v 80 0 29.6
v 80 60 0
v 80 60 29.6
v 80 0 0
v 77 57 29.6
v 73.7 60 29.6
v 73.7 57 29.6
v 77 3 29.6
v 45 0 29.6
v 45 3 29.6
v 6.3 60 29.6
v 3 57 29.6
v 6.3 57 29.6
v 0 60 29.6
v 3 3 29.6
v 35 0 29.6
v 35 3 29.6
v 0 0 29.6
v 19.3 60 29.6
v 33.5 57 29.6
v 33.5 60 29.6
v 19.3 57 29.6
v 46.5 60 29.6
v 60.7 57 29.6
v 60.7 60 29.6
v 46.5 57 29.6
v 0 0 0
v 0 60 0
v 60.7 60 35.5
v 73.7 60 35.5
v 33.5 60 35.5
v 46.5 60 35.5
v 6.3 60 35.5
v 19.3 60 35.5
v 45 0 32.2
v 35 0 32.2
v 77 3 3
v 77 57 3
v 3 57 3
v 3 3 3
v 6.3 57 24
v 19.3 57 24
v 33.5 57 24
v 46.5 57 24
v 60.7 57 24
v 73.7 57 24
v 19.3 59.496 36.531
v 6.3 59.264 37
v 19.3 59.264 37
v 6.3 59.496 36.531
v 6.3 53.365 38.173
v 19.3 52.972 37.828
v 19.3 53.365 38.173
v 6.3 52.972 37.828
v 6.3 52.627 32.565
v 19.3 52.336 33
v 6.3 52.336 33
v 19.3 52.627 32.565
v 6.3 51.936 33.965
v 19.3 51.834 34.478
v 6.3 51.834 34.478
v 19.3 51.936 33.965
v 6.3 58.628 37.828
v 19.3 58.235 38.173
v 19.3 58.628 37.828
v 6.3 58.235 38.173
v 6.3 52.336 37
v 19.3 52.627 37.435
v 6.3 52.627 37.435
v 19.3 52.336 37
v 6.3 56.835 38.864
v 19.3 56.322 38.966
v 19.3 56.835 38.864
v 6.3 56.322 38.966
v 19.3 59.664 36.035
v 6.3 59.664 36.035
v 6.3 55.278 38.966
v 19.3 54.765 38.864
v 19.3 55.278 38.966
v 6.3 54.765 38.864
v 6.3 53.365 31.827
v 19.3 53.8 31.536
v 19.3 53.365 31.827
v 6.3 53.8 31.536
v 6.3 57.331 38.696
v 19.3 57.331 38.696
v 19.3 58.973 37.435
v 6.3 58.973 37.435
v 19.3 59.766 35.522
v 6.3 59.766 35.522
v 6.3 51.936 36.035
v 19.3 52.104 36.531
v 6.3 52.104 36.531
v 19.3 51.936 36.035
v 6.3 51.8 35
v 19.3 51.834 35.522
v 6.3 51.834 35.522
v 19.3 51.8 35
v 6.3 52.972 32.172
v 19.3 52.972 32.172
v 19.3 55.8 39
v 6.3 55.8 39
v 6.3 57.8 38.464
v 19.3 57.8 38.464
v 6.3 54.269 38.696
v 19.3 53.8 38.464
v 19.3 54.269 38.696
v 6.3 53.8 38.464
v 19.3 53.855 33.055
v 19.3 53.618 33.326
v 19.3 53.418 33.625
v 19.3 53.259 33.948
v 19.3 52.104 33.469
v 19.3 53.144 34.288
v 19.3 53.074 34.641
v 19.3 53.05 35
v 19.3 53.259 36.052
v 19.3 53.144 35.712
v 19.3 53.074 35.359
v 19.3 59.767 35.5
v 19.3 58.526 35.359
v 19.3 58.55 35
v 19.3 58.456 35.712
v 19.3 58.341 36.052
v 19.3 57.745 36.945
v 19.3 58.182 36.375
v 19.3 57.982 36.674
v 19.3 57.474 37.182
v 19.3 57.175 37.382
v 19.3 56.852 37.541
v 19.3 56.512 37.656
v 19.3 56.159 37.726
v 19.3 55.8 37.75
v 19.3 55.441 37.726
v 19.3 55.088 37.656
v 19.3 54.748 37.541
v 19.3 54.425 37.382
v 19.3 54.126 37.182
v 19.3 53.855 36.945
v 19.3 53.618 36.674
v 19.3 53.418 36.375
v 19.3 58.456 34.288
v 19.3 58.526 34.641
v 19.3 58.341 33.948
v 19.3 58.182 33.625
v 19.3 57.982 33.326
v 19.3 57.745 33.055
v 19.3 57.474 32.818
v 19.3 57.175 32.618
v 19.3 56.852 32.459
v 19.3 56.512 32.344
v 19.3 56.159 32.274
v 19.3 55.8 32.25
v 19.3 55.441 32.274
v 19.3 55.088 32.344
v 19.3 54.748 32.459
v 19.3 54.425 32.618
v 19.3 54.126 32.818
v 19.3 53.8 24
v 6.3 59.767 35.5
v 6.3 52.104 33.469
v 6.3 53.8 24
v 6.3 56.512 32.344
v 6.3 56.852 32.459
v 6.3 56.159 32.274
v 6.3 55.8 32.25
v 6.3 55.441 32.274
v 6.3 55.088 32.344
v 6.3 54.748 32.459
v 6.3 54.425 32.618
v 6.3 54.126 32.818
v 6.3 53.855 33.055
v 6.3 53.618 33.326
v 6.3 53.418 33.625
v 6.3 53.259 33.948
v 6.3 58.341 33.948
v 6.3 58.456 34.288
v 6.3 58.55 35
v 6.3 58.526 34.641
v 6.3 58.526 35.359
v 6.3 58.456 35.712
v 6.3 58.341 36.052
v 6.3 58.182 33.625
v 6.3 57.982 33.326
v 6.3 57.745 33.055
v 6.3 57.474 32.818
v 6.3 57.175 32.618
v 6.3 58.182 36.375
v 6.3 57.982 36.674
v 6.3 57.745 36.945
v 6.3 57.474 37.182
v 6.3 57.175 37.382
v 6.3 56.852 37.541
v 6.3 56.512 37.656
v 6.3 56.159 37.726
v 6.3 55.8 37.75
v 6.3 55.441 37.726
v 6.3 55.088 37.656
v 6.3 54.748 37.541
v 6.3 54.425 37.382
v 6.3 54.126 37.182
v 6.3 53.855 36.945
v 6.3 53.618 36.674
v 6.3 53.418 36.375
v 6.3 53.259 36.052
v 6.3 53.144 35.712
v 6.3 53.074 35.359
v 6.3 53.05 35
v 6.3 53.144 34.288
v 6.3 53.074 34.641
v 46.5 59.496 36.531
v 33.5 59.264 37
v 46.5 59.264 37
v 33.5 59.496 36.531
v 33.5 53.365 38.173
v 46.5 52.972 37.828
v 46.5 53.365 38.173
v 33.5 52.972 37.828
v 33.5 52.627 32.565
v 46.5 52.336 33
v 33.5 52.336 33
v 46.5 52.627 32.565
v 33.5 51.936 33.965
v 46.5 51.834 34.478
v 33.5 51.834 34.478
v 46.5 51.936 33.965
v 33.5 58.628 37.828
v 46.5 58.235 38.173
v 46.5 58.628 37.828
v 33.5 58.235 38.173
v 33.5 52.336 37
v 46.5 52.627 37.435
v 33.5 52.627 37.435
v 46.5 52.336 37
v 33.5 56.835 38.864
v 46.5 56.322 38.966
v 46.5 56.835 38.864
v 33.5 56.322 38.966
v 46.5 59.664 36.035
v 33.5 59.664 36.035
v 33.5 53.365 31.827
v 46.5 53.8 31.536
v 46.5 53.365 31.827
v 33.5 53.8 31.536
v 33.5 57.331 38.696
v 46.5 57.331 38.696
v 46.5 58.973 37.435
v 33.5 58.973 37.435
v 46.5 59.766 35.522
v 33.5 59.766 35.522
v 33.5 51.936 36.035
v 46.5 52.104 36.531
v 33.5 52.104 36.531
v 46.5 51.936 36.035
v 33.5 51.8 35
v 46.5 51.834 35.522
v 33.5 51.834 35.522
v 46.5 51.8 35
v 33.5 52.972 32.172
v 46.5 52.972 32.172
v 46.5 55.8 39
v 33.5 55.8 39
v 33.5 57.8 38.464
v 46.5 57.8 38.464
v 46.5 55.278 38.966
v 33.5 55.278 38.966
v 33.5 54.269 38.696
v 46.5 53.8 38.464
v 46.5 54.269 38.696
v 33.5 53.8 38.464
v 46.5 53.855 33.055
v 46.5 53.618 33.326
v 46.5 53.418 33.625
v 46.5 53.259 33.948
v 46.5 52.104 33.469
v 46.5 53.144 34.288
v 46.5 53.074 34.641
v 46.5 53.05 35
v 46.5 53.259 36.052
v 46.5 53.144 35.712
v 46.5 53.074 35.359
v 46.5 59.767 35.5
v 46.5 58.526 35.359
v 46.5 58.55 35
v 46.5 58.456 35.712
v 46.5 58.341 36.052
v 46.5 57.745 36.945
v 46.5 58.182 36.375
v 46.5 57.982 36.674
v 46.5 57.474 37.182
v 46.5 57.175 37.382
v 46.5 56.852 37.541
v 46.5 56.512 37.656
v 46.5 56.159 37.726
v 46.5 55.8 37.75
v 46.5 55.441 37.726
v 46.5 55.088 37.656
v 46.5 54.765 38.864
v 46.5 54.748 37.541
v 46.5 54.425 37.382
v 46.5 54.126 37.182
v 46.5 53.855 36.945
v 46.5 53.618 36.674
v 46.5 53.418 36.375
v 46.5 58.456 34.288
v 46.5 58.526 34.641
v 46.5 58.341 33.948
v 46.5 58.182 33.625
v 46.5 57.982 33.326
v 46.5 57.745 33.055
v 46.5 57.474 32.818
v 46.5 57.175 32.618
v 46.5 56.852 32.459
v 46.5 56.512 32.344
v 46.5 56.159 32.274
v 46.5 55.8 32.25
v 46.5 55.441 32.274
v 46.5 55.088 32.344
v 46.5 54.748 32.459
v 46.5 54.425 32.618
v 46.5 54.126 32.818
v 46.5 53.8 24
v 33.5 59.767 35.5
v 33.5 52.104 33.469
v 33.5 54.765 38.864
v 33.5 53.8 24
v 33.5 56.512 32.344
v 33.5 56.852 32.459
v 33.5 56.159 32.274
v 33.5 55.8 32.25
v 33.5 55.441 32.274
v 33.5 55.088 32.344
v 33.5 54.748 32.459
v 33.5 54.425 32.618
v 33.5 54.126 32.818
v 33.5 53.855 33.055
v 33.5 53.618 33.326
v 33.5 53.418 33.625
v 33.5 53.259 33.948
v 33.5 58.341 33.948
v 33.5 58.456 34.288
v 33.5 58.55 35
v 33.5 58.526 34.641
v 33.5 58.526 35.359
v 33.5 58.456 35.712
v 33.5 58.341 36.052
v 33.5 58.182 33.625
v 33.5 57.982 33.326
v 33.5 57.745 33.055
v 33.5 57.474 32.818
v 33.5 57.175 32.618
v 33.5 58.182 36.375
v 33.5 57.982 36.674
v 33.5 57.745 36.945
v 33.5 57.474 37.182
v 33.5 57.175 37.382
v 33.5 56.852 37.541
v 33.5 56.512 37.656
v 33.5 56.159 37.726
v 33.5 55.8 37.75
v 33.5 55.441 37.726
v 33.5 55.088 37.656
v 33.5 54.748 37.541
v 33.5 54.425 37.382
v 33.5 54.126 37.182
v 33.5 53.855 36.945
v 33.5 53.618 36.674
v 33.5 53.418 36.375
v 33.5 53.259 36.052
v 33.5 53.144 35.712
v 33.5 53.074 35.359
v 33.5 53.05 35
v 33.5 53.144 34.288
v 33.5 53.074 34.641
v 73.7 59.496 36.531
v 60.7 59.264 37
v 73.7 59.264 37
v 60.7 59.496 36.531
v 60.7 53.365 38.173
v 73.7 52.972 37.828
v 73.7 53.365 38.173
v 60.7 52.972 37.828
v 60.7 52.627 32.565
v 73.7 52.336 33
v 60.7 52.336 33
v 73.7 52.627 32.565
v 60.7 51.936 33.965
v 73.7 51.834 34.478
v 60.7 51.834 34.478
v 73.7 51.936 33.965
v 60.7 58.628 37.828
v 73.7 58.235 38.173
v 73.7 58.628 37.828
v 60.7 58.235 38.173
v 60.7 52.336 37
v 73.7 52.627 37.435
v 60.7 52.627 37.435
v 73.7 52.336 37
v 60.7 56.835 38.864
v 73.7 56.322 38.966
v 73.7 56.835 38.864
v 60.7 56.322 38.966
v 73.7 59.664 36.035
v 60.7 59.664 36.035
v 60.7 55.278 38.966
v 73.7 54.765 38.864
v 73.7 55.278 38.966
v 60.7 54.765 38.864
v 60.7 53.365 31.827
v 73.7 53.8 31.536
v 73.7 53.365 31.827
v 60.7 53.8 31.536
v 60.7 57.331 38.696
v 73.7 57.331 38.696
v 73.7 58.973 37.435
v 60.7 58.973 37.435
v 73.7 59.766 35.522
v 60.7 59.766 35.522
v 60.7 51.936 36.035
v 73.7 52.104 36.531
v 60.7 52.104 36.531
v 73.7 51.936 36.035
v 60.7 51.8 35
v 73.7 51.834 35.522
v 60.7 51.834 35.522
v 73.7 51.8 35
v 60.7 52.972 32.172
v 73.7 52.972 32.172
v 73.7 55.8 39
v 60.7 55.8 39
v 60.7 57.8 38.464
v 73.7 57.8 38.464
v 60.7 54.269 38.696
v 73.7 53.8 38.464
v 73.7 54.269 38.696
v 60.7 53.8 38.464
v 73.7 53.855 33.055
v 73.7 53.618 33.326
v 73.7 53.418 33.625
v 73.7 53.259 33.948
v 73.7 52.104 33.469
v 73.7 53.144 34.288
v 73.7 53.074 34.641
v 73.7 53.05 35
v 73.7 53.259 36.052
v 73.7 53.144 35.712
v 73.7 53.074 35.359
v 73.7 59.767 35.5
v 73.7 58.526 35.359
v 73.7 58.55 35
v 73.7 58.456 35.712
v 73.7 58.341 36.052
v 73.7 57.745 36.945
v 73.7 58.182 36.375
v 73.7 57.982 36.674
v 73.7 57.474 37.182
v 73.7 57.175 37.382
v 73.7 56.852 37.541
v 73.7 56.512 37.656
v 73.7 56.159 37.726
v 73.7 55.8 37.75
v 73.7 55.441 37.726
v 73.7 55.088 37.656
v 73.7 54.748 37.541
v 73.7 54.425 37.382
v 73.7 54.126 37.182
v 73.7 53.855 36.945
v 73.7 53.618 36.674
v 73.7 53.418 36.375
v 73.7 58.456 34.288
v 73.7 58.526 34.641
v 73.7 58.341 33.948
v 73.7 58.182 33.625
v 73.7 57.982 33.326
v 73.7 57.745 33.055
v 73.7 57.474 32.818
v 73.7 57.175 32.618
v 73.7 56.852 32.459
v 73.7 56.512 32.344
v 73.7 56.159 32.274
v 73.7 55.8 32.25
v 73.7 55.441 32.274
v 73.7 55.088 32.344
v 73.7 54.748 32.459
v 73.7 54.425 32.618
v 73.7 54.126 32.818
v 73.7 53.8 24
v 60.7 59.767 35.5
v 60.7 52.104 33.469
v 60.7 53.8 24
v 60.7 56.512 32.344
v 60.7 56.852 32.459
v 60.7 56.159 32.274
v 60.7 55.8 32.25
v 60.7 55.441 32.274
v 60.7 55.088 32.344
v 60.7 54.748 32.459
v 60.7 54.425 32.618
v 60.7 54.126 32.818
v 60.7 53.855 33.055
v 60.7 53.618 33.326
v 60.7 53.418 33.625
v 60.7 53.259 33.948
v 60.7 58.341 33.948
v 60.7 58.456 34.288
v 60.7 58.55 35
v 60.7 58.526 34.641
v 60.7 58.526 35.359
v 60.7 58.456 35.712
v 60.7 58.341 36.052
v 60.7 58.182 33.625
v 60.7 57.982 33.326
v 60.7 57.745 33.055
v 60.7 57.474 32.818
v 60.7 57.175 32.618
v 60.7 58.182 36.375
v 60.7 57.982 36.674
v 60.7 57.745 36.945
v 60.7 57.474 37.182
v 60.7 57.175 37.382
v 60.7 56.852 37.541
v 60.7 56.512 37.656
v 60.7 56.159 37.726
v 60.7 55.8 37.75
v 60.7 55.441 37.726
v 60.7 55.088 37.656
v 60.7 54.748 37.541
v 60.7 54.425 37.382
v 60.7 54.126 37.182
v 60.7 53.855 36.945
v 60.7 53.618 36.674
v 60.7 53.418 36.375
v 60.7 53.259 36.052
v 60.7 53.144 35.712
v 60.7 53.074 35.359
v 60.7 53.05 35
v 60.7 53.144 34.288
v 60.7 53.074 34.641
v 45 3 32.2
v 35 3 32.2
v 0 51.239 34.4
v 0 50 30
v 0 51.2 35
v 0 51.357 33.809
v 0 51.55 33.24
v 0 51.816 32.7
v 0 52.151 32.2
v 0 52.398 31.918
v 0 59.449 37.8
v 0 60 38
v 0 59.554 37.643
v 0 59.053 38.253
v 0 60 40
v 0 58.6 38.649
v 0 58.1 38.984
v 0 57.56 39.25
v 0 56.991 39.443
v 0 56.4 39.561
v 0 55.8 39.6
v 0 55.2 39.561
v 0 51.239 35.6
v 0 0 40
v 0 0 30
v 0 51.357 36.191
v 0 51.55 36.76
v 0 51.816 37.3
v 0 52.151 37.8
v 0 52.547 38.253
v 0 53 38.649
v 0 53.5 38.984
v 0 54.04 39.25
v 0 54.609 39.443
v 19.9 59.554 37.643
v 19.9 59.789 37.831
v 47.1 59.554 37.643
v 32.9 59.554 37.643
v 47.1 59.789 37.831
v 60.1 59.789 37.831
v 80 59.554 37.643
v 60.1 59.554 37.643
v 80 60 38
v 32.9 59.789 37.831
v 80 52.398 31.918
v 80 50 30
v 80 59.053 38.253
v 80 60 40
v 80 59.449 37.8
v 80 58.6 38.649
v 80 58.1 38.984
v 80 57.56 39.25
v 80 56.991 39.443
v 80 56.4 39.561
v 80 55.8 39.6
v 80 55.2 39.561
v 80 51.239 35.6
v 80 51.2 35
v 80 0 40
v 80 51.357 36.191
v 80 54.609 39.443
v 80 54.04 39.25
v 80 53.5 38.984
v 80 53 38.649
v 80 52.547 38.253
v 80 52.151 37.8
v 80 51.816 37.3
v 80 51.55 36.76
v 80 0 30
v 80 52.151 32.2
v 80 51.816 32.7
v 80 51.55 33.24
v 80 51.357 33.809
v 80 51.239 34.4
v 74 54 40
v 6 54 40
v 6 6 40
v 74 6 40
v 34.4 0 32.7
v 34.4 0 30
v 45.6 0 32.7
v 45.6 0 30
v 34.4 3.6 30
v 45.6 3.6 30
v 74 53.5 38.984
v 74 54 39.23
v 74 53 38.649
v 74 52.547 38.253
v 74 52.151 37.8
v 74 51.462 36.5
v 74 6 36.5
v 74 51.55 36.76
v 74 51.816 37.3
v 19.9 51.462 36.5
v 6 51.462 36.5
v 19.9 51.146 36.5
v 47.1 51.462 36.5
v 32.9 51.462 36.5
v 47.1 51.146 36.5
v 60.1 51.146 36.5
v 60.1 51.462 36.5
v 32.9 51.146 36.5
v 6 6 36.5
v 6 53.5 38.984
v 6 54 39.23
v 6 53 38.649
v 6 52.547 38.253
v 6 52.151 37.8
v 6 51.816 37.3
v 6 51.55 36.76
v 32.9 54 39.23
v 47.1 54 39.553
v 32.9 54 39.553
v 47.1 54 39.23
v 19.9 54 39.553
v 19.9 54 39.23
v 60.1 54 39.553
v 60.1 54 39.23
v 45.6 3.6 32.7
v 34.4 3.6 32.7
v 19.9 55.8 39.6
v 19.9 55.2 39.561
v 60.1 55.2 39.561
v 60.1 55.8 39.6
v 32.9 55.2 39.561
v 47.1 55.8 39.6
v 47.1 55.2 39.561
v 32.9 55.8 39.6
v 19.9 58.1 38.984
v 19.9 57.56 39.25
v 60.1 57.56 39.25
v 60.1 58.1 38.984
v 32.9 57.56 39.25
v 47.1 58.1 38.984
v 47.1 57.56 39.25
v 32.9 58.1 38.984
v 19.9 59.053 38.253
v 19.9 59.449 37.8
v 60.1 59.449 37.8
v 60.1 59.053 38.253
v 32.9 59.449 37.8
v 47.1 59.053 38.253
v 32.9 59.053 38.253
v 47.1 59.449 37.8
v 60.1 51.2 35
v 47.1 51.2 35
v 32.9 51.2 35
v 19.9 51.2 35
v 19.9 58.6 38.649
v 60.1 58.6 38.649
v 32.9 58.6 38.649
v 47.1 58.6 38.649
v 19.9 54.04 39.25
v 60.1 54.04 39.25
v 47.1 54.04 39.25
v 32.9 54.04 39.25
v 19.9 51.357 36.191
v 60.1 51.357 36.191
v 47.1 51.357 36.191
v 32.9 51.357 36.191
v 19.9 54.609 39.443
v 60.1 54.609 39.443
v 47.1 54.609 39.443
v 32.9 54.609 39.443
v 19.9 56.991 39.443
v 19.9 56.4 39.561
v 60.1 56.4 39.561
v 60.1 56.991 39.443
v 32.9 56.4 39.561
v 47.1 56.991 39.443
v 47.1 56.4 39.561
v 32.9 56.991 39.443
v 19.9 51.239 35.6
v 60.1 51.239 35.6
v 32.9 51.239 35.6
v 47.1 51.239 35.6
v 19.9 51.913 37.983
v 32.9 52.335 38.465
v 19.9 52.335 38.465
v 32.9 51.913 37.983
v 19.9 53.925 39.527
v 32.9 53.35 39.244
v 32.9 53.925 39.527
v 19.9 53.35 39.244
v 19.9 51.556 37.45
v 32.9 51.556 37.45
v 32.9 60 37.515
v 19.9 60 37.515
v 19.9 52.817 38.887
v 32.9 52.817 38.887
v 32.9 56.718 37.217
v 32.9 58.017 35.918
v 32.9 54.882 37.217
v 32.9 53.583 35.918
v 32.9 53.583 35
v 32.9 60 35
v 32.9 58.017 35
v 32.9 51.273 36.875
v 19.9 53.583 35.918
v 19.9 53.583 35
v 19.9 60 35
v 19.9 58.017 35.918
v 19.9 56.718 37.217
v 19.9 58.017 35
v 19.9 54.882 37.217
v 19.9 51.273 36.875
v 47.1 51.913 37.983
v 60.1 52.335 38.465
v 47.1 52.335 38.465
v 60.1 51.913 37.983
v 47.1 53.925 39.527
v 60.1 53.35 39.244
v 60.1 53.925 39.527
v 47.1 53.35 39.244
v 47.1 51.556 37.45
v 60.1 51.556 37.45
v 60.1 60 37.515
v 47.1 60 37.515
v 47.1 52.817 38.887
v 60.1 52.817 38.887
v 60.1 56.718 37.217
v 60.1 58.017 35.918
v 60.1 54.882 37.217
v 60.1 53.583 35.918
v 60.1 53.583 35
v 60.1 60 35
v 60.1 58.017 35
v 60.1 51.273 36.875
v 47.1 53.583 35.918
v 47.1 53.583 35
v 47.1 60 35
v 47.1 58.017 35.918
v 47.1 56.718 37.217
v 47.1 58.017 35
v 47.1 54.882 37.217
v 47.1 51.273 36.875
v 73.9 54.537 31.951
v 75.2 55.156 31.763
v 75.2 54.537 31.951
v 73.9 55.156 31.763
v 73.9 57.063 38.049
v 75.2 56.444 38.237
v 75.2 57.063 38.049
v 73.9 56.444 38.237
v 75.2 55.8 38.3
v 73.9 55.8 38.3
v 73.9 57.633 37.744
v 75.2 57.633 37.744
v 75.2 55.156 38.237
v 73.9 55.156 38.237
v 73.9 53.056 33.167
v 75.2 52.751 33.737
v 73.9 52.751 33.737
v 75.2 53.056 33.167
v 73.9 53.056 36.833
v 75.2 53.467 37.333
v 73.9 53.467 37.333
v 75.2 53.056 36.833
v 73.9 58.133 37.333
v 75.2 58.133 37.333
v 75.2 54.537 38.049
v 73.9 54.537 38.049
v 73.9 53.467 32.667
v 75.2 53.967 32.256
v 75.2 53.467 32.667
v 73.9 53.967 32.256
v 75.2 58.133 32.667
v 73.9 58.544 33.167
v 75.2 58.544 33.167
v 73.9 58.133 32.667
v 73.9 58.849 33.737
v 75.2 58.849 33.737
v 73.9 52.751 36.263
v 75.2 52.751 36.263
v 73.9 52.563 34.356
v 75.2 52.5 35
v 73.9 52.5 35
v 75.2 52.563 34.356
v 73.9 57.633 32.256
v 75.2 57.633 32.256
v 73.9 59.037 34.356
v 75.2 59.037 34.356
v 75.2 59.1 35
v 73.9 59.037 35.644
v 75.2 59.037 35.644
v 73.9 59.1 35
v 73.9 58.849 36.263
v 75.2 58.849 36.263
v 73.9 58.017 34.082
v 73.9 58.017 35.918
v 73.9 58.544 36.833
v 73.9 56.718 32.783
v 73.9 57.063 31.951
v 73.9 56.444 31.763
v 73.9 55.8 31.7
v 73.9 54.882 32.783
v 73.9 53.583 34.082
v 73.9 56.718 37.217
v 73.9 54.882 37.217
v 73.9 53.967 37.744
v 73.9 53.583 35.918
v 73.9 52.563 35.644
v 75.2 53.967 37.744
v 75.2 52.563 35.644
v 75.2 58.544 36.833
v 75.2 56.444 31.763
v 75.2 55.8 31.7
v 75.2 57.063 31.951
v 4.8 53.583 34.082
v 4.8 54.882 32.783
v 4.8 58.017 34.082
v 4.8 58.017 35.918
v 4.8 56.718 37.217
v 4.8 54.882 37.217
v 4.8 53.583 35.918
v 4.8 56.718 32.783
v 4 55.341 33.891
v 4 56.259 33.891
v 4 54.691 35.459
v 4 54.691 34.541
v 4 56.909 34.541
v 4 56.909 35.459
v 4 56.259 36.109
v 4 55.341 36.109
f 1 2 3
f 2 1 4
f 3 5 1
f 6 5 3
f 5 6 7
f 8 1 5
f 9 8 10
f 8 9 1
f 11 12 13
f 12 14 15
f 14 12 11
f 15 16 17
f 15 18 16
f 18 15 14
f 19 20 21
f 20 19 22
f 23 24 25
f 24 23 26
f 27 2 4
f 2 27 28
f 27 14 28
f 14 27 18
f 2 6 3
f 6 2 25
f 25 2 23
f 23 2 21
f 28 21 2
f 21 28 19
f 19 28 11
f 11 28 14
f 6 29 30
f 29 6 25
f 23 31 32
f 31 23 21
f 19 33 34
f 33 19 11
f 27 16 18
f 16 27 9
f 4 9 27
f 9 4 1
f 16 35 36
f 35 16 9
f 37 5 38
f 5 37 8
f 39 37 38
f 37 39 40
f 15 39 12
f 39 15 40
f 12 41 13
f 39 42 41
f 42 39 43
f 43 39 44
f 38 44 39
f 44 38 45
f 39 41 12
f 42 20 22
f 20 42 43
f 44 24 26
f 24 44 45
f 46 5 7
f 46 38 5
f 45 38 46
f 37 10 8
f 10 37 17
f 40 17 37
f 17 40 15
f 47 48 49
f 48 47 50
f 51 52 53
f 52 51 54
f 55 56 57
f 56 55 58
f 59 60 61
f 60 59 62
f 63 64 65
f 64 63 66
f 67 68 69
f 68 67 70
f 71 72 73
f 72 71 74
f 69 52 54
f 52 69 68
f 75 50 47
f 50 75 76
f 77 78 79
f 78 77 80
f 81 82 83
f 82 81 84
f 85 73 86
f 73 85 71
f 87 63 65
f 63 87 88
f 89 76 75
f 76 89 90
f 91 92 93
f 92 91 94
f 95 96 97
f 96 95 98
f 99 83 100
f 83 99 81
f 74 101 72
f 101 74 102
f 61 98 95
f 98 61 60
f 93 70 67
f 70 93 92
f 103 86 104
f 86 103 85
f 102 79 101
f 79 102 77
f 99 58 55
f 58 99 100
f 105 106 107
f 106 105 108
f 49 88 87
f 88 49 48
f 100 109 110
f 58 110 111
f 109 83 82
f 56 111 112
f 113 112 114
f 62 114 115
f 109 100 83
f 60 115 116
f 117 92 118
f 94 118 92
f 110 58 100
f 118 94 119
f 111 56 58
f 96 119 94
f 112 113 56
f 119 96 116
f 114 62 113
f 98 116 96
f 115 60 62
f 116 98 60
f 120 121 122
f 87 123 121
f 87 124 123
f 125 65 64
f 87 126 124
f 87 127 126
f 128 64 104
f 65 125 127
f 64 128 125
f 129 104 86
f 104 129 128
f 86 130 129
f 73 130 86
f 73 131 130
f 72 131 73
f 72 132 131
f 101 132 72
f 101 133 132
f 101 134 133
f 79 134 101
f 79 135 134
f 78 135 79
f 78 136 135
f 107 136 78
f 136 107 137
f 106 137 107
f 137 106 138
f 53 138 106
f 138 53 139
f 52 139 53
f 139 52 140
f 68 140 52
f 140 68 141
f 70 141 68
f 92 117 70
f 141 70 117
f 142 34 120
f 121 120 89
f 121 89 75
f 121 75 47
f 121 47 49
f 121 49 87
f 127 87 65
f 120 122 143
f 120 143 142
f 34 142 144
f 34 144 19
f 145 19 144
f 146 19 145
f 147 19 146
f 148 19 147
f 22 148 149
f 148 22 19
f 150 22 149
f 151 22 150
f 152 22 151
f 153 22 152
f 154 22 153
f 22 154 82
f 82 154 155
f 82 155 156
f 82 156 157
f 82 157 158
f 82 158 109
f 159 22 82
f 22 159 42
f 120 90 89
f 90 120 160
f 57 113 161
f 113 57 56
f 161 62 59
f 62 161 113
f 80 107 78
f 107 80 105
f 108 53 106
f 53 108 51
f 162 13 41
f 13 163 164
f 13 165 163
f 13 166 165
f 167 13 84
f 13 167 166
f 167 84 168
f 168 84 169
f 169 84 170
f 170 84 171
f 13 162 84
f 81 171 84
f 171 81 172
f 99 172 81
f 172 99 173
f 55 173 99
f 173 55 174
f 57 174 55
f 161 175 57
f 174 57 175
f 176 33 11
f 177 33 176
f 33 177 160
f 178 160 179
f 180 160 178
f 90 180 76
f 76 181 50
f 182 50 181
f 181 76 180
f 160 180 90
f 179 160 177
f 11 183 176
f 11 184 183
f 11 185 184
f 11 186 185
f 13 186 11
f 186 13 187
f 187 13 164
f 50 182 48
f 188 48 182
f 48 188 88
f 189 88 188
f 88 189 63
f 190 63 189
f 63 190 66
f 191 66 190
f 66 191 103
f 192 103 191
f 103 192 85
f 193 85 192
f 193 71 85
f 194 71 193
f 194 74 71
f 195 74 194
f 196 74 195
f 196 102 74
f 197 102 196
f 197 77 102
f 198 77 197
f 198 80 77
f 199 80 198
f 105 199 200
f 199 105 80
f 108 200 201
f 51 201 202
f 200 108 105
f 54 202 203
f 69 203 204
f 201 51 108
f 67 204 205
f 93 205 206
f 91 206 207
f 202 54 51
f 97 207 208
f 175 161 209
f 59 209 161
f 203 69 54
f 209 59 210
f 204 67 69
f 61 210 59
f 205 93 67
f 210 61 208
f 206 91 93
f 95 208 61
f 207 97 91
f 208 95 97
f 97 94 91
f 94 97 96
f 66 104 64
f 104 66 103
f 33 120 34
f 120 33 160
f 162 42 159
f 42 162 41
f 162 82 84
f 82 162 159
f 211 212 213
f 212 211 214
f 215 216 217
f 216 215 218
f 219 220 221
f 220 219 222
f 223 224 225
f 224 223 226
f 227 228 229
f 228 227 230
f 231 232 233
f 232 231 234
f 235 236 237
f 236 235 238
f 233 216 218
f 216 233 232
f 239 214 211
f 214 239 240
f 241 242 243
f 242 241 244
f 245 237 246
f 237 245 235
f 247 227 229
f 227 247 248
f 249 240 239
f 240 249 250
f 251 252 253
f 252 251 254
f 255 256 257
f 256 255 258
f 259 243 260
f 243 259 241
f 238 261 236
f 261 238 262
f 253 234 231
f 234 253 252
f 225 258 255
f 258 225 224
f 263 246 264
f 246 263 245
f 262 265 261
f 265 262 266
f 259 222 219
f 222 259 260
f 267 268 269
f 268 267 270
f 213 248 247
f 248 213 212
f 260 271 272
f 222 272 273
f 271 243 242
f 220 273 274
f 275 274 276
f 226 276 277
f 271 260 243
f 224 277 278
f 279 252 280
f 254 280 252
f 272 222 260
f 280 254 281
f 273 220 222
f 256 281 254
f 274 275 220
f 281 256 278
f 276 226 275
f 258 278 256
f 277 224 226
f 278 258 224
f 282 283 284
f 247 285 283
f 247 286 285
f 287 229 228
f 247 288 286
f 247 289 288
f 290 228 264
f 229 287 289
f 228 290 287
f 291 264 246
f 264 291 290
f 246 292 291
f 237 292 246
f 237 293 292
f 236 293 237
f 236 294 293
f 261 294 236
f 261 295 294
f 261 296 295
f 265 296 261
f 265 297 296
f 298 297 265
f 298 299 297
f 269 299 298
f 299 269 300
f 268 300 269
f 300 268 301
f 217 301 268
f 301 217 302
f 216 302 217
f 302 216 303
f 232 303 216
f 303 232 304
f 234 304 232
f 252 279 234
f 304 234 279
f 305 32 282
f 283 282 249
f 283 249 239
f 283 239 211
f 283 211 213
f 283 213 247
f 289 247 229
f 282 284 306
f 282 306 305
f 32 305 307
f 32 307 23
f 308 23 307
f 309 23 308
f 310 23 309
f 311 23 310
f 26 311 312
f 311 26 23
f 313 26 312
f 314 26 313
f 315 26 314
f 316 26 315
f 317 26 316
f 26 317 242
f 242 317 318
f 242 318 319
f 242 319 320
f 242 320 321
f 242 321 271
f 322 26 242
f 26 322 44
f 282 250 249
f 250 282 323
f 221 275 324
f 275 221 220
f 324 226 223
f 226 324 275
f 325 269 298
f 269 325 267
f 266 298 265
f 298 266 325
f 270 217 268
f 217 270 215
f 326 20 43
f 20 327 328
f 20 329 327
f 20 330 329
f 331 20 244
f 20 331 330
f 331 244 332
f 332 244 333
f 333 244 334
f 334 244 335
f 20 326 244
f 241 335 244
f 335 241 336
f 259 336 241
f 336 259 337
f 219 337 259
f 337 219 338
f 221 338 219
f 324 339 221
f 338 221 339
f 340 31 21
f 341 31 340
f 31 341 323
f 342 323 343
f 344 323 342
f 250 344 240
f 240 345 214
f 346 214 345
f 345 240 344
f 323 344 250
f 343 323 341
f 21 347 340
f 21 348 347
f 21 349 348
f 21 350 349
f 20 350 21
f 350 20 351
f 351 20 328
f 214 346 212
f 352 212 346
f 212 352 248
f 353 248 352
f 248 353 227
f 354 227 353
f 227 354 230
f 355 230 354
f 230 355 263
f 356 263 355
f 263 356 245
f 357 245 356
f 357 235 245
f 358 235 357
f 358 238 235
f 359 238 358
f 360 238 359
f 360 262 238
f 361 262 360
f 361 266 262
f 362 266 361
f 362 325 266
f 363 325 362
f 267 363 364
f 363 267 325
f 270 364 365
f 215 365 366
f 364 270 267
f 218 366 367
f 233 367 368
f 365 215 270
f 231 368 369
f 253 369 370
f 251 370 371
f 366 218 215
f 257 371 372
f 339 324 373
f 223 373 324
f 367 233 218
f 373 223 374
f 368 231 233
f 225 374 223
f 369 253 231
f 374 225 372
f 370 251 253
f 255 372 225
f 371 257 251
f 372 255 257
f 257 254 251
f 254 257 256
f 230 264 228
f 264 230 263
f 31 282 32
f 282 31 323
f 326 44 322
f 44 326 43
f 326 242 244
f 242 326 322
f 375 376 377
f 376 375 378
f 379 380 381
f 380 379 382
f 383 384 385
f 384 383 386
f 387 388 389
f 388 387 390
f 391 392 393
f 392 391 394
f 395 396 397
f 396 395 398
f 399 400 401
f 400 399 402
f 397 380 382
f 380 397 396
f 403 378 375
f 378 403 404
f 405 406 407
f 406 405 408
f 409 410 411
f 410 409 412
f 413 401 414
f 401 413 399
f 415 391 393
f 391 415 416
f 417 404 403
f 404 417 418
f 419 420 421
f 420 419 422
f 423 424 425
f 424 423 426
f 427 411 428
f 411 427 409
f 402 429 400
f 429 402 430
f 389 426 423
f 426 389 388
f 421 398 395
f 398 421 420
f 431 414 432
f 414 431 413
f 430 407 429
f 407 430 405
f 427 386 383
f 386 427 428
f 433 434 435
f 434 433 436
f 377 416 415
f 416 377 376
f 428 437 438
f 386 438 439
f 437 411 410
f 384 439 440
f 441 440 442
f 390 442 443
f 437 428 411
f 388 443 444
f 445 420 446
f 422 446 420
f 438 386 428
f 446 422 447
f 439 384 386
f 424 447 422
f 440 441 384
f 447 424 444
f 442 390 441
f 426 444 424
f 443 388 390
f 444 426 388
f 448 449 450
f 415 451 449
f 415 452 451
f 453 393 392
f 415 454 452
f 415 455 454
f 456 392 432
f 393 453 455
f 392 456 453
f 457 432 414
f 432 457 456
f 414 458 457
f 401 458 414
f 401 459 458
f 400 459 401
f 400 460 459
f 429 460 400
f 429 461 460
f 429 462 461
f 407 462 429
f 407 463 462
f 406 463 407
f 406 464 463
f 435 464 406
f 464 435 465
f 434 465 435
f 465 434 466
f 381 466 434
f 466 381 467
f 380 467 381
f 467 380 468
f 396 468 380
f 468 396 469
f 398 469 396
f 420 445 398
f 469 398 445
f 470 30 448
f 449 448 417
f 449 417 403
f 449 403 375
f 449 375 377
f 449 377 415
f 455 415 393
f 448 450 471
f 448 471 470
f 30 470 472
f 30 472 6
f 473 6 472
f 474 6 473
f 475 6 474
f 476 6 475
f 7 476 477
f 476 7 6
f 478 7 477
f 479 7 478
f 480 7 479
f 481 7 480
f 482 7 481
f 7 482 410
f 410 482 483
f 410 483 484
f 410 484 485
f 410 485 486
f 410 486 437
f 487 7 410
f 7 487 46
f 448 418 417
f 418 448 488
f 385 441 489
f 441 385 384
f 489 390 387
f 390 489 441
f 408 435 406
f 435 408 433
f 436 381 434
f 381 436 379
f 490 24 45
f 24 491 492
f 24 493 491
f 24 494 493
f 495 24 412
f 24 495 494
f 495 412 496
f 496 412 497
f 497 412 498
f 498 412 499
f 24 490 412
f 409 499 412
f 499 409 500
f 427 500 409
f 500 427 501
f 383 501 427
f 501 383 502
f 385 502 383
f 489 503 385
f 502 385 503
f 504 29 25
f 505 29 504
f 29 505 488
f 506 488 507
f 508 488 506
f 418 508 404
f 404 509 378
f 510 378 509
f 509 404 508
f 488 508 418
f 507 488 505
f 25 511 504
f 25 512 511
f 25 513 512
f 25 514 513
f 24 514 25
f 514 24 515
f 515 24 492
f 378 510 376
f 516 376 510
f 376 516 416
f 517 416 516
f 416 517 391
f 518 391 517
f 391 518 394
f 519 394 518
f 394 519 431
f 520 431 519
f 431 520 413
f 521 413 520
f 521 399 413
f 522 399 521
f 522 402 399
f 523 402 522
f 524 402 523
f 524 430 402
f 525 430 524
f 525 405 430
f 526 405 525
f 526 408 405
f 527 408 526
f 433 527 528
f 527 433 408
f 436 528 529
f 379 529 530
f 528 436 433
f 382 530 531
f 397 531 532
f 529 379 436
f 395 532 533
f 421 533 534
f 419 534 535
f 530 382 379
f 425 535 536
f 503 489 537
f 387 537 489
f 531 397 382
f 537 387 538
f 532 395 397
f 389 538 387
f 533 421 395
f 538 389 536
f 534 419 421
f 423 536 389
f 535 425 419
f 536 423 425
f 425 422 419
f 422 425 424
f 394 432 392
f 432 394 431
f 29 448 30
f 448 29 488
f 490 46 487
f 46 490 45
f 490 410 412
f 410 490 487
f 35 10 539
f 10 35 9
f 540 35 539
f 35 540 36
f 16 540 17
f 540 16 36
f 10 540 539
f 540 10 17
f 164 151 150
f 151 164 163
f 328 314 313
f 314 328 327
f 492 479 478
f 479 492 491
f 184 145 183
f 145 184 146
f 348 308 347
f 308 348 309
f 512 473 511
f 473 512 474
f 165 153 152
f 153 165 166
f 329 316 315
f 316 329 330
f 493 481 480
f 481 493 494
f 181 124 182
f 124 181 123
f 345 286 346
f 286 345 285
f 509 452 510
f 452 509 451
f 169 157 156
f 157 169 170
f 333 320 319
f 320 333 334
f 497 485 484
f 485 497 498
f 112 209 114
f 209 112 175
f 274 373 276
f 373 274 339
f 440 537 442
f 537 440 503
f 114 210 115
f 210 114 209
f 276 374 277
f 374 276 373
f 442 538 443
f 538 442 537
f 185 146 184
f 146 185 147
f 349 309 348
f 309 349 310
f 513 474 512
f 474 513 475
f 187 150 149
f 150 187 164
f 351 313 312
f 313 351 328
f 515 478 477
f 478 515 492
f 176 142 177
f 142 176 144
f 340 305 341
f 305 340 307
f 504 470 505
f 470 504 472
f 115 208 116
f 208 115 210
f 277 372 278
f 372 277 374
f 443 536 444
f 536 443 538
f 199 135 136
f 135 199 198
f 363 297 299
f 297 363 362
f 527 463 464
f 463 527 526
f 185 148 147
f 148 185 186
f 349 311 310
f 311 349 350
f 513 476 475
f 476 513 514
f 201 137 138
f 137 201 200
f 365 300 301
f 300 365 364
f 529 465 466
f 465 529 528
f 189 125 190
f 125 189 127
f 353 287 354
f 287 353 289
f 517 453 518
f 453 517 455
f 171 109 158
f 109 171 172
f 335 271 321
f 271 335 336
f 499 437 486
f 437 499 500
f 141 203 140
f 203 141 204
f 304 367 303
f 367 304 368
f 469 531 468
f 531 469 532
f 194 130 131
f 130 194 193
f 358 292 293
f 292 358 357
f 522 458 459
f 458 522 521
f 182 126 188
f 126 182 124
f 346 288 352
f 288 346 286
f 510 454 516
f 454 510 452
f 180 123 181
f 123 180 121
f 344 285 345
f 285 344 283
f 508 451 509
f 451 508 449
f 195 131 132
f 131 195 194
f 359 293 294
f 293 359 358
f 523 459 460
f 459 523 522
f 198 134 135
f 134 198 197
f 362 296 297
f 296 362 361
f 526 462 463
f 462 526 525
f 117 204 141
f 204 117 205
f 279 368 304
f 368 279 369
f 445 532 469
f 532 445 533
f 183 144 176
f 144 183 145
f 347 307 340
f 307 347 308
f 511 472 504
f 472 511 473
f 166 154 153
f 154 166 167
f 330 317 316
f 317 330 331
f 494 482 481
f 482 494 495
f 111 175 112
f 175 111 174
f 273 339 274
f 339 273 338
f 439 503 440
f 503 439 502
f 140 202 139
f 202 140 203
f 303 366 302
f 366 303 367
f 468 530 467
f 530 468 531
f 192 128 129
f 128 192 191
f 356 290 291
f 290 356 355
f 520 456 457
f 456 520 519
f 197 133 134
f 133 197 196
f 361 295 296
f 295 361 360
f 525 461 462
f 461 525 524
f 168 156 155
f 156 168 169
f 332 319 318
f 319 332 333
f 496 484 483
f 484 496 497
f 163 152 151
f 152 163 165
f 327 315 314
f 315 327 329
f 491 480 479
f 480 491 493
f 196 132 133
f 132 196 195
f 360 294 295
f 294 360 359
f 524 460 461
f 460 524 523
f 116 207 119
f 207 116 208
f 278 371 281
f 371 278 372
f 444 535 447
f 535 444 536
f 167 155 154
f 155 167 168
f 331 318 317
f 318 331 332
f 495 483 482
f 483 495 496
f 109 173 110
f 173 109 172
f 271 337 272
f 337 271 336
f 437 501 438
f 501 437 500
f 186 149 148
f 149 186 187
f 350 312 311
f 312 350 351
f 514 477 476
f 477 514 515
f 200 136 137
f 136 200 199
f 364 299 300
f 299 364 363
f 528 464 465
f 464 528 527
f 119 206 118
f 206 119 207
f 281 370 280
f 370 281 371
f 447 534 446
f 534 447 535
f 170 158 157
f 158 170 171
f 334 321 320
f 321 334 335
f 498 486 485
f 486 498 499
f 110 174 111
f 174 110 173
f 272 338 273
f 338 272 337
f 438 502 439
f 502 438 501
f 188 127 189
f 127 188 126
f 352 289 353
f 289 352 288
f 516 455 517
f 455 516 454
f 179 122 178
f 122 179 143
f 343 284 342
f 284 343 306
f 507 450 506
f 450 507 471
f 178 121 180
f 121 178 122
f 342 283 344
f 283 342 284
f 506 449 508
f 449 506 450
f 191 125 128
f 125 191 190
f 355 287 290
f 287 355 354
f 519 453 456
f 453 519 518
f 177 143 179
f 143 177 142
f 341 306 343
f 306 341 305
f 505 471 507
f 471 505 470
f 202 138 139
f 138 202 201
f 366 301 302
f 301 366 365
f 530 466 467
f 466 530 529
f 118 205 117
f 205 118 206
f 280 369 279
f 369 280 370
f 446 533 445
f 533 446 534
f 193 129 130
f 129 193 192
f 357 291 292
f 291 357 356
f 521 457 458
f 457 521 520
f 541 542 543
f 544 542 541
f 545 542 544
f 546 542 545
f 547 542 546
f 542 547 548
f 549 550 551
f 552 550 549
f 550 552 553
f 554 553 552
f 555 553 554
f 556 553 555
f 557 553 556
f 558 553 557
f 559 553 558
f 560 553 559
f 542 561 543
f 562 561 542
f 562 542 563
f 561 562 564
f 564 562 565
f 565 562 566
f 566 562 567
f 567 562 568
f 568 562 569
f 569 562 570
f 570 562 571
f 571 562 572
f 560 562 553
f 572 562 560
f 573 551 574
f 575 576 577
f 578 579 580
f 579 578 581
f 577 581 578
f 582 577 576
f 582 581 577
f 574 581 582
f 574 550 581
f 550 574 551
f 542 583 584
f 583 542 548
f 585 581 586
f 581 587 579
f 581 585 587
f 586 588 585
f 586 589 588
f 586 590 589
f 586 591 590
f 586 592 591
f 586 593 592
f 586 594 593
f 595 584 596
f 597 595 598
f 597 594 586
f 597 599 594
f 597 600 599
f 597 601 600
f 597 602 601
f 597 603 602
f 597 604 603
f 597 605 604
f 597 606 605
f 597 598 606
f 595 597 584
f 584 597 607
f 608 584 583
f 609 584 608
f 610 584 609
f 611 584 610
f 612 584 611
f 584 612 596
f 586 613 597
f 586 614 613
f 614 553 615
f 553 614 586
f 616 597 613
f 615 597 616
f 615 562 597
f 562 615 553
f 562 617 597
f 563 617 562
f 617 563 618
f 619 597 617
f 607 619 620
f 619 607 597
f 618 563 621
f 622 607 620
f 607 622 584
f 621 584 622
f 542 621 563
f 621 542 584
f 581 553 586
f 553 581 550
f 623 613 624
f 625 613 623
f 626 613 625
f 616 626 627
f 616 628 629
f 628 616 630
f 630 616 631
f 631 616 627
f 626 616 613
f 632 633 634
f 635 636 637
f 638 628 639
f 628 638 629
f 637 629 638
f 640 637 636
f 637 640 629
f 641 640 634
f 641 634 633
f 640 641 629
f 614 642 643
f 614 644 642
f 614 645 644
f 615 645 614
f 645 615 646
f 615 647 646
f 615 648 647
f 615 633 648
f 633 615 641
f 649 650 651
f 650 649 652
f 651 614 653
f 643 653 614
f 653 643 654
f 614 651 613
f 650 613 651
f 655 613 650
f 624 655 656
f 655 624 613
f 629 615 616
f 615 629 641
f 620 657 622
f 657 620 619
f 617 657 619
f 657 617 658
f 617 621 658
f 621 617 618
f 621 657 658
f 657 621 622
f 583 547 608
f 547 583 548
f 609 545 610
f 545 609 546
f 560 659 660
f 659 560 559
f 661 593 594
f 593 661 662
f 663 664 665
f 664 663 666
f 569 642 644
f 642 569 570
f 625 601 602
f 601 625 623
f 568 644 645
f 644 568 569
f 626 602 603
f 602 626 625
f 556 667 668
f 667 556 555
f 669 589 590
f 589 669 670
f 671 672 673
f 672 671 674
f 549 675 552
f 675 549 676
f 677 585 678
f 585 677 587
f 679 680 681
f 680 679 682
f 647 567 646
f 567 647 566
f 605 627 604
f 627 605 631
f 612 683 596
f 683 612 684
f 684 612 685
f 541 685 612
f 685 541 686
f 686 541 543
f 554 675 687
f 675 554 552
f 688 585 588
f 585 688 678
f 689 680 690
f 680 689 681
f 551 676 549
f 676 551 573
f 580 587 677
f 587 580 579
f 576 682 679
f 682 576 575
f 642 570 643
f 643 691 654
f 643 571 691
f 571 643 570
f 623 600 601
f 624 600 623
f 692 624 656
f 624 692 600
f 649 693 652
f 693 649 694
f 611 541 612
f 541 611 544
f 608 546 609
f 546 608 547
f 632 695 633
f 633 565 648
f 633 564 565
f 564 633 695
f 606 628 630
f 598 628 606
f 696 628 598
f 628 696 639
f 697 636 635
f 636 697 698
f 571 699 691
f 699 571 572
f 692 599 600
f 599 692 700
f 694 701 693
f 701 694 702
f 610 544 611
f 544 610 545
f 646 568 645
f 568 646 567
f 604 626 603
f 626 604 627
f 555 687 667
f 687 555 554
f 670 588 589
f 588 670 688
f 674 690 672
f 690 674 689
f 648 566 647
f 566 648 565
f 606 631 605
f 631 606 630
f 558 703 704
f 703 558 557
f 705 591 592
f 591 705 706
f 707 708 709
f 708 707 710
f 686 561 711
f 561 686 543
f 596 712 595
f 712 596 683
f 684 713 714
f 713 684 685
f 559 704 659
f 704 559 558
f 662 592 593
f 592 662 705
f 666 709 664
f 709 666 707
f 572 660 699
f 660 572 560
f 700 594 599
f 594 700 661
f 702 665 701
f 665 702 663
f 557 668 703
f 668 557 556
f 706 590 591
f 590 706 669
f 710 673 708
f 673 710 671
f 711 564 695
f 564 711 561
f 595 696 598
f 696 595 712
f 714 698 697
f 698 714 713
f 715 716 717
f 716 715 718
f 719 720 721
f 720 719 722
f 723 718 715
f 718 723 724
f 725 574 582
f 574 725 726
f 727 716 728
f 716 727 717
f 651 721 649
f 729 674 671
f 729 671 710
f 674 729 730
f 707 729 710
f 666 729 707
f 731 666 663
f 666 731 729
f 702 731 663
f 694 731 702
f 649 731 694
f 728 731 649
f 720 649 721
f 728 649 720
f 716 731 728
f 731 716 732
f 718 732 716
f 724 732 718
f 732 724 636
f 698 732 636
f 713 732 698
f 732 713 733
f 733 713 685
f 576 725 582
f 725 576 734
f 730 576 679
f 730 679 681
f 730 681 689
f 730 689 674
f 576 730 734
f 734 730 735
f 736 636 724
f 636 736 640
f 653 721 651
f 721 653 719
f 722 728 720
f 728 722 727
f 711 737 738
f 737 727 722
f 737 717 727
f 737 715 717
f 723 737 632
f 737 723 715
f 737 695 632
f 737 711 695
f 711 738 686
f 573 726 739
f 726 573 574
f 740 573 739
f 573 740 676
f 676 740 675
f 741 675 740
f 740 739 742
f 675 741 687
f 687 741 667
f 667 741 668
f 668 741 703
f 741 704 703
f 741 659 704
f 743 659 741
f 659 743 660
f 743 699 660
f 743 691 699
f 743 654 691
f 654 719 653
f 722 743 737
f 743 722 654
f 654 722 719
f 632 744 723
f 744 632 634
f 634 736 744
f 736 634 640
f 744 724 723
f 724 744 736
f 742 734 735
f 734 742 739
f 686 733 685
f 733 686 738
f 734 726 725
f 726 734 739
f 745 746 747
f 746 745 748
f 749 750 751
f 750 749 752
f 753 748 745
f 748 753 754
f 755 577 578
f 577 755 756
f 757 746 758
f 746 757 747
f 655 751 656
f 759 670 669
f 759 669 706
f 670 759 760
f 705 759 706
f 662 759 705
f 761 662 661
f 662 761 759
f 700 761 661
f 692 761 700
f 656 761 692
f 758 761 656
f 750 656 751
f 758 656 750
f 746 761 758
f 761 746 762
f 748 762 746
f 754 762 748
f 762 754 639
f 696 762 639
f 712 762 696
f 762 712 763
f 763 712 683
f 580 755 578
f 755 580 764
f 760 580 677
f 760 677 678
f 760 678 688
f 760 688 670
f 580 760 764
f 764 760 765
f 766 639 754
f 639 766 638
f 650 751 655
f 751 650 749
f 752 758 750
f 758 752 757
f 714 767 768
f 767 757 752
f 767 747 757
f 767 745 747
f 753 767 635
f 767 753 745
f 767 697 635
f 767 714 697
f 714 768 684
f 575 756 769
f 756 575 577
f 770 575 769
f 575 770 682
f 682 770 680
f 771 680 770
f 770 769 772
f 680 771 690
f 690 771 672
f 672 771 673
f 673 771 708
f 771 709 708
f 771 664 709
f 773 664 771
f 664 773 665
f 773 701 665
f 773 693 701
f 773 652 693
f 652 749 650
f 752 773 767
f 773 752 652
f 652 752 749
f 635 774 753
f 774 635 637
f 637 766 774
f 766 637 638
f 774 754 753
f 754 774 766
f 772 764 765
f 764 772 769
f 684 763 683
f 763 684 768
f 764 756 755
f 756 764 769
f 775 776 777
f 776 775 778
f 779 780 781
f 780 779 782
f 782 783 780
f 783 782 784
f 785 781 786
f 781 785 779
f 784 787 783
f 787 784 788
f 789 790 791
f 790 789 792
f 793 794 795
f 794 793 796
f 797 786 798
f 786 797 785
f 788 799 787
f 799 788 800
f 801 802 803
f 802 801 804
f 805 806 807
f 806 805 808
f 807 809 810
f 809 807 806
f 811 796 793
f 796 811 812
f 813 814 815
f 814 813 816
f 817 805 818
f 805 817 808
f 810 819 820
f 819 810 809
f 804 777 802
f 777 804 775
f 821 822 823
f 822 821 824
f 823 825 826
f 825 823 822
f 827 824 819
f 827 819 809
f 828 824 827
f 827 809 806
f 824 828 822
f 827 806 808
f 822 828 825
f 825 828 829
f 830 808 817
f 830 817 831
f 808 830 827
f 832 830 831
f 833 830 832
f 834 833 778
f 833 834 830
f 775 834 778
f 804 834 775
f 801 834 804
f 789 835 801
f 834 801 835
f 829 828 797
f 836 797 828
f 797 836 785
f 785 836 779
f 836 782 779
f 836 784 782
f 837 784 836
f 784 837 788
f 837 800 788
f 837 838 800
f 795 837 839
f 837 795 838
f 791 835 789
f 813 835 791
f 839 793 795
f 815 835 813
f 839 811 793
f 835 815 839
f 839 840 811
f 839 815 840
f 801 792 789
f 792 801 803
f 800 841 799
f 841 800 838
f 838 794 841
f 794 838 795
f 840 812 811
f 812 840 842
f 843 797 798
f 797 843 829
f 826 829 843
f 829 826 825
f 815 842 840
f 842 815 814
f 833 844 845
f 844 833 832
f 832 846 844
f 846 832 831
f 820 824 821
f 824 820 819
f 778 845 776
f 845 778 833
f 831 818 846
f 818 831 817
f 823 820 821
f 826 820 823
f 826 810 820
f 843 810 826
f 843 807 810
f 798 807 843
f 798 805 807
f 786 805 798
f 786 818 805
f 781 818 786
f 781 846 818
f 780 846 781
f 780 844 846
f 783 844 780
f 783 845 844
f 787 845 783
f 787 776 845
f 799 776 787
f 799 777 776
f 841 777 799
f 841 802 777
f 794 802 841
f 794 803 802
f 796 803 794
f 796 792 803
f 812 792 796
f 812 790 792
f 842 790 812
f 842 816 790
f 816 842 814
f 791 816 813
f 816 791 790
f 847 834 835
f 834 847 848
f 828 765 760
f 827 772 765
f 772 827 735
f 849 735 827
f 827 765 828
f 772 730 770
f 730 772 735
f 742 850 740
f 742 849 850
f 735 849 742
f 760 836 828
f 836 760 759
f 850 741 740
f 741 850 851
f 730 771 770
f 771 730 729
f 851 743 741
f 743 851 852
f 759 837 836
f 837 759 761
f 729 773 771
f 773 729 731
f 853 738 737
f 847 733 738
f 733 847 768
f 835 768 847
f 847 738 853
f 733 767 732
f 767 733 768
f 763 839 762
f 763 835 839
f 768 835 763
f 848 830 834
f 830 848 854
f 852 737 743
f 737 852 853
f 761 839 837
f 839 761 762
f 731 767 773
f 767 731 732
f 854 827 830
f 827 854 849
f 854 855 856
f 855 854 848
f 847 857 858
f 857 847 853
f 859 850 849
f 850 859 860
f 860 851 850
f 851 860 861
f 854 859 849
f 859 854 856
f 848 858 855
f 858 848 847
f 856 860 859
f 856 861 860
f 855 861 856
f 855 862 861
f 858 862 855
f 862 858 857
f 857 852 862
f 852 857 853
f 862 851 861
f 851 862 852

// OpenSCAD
// Print-in-place hinged box, 80 x 60 x 40 mm closed.
// Printed closed in PLA (Bambu A1, 0.4 nozzle): base, lid and a captive
// hinge pin are separate bodies with 0.35-0.6 mm clearances, so the hinge
// breaks free by hand.  No supports: the lid underside bridges the cavity,
// the hinge barrels/pin use faceted (octagonal) lower surfaces, and all
// other downward faces are short bridges or rest on the body below.

/* [Part] */
part = "assembly"; // [assembly, box, lid, pin]

/* [Dimensions] */
box_w = 80;          // X, outside
box_d = 60;          // Y, outside (front y=0, back y=60)
box_h = 29.6;        // base height to its rim
lid_h = 10;          // lid height; lid bottom at z=30 (0.4 gap)
lid_z = 30;
wall = 3;
floor_t = 3;
total_h = 40;

hinge_y = 55.8;      // hinge axis, assembly coords
hinge_z = 35;
barrel_r = 4.0;
pin_r = 2.4;         // octagon circumradius
bore_r = 2.75;       // pin_r + 0.35 radial clearance
relief_r = 4.6;      // barrel_r + 0.6

// Alternating knuckles along the back edge (x intervals), 0.6 mm end gaps.
box_segs  = [[6.3, 19.3], [33.5, 46.5], [60.7, 73.7]];
lid_segs  = [[19.9, 32.9], [47.1, 60.1]];

cadverify_only = "";
module instance(name, part_name, unit = 1) {
    echo(cadverify_instance = [name, part_name, unit]);
    if (cadverify_only == "" || cadverify_only == name) children();
}

// ---------------------------------------------------------------- base (box)
module box_main() {
    difference() {
        union() {
            // shell: outer block minus open-top cavity
            difference() {
                cube([box_w, box_d, box_h]);
                translate([wall, wall, floor_t]) cube([box_w - 2 * wall, box_d - 2 * wall, box_h]);
            }
            // hinge knuckles (base) + support posts down to the back wall
            for (s = box_segs) {
                translate([s[0], hinge_y, hinge_z]) rotate([0, 90, 0])
                    cylinder(h = s[1] - s[0], r = barrel_r, $fn = 48);
                translate([s[0], 53.8, 24]) cube([s[1] - s[0], 6.2, 11.5]);
            }
            // front catch tooth (enters the socket in the lid)
            translate([35, 0, box_h]) cube([10, wall, 2.6]);
        }
        // pin bore through the base knuckles
        translate([-1, hinge_y, hinge_z]) rotate([0, 90, 0])
            cylinder(h = box_w + 2, r = bore_r, $fn = 48);
    }
}

// ---------------------------------------------------------------- lid (local: z 0..10, hinge axis at z=5)
module lid_main() {
    union() {
        difference() {
            union() {
                // main slab, side profile (Y-Z) extruded along X.
                // Rear lower edge chamfered 50,0 -> 60,8 so the slab
                // swings clear of the base back wall.
                multmatrix([[0, 0, 1, 0], [1, 0, 0, 0], [0, 1, 0, 0], [0, 0, 0, 1]])
                    linear_extrude(height = box_w)
                        polygon(points = [[0, 0], [50, 0], [60, 8], [60, 10], [0, 10]]);
                // hinge knuckles (lid)
                for (s = lid_segs)
                    translate([s[0], hinge_y, 5]) rotate([0, 90, 0])
                        cylinder(h = s[1] - s[0], r = barrel_r, $fn = 48);
            }
            // recessed panel in the top face
            translate([6, 6, 6.5]) cube([68, 48, 4]);
            // front catch socket (tooth: x35..45, z assy 29.6..32.2)
            translate([34.4, -1, -0.5]) cube([11.2, 4.6, 3.2]);
            // clearance tunnel for the base knuckles / pin
            translate([-1, hinge_y, 5]) rotate([0, 90, 0])
                cylinder(h = box_w + 2, r = relief_r, $fn = 48);
            // pin bore through the lid knuckles
            translate([-1, hinge_y, 5]) rotate([0, 90, 0])
                cylinder(h = box_w + 2, r = bore_r, $fn = 48);
        }
        // webs joining lid knuckles to the slab: upper half-discs r=4.9
        // (stay above z=30.1 in assembly, clear of the base rim at 29.6)
        for (s = lid_segs)
            intersection() {
                translate([s[0], hinge_y, 5]) rotate([0, 90, 0])
                    cylinder(h = s[1] - s[0], r = 4.9, $fn = 48);
                translate([s[0], hinge_y - 10, 5]) cube([s[1] - s[0], 20, 5]);
                translate([s[0], 0, 0]) cube([s[1] - s[0], box_d, lid_h]);
            }
    }
}

// ---------------------------------------------------------------- pin
// Centred on its axis, local +Z from head (z=0) to tip (z=71.2).
module pin_geom() {
    union() {
        cylinder(h = 1.3, r = 3.3, $fn = 32);                    // head
        translate([0, 0, 1.3]) rotate([0, 0, 22.5])
            cylinder(h = 69.1, r = pin_r, $fn = 8);              // octagonal shaft
        translate([0, 0, 70.4]) rotate([0, 0, 22.5])
            cylinder(h = 0.8, r1 = pin_r, r2 = 1.2, $fn = 8);    // lead-in tip
    }
}
module pin_part() { translate([3.3, 3.3, 0]) pin_geom(); }

// ---------------------------------------------------------------- output
if (part == "box") {
    echo(cadverify_spec = [
        ["bounds", [[0, 0, 0], [box_w, box_d, hinge_z + barrel_r]]],
        ["bodies", 1],
        ["copies", 1],
        ["support_faces", [["bed", "-z", 4000]]],
        ["overhangs_allowed", [["hinge knuckles and pin bore print in place; faceted bore ceiling is a short internal bridge", [[5, 51, 30], [75, 60, 39.5]]]]],
        ["details", [
            ["cavity", "void", [[4, 4, 10], [76, 53, 29]], 0.95],
            ["front_wall", "thickness", [40, -1, 15], [0, 1, 0], 3],
            ["floor", "thickness", [40, 30, -1], [0, 0, 1], 3],
            ["box_knuckle", "material", [[7, 54, 33], [18, 58, 37]], 0.5],
            ["pin_bore", "void", [[8, 54.5, 33.5], [17, 57, 36.5]], 0.55],
            ["catch_tooth", "material", [[36, 0.5, 30], [44, 2.5, 32]], 0.85],
            ["hinge_knuckles", "view", [[4, 50, 28], [76, 60, 39.5]]]
        ]]
    ]);
    box_main();
} else if (part == "lid") {
    echo(cadverify_spec = [
        ["bounds", [[0, 0, 0], [box_w, box_d, lid_h]]],
        ["bodies", 1],
        ["copies", 1],
        ["support_faces", [["print_face", "-z", 3000]]],
        ["overhangs_allowed", [["lid knuckle bores print in place around the pin; bore ceilings are short internal bridges", [[5, 51, 0], [75, 60, 10]]]]],
        ["details", [
            ["top_pocket", "void", [[7, 7, 6.6], [73, 53, 9.9]], 0.95],
            ["lid_slab", "thickness", [40, 30, 9], [0, 0, -1], 6.5],
            ["lid_knuckle", "material", [[21, 54, 3], [32, 58, 7]], 0.5],
            ["pin_bore", "void", [[22, 54.5, 3.5], [31, 57, 6.5]], 0.55],
            ["catch_socket", "void", [[35, 0.5, 0.2], [45, 2.5, 2.5]], 0.9],
            ["hinge_knuckles", "view", [[4, 50, 0], [76, 60, 10]]]
        ]]
    ]);
    lid_main();
} else if (part == "pin") {
    echo(cadverify_spec = [
        ["bounds", [[0, 0, 0], [6.6, 6.6, 71.2]]],
        ["bodies", 1],
        ["copies", 1],
        ["support_faces", [["head_base", "-z", 30]]],
        ["overhangs_allowed", []],
        ["details", [
            ["pin_shaft", "material", [[2, 2, 10], [4.6, 4.6, 20]], 0.9],
            ["pin_head", "material", [[1, 1, 0.1], [5.6, 5.6, 1.2]], 0.75],
            ["pin_length", "thickness", [3.3, 3.3, 72], [0, 0, -1], 71.2],
            ["pin_head_view", "view", [[0, 0, 0], [6.6, 6.6, 2]]]
        ]]
    ]);
    pin_part();
} else if (part == "assembly") {
    echo(cadverify_spec = [
        ["bounds", [[0, 0, 0], [box_w, box_d, total_h]]],
        ["support_faces", [["bed", "-z", 4000]]],
        ["allowed_interferences", []],
        ["motions", [
            ["lid_swing", ["lid"], "rotate", [0, hinge_y, hinge_z], [-1, 0, 0], [0, 110]]
        ]],
        ["assembly_order", [
            [["base"], [0, 0, 0]],
            [["lid"], [0, 0, -1]],
            [["pin"], [-1, 0, 0]]
        ]]
    ]);
    instance("base", "box") box_main();
    instance("lid", "lid") translate([0, 0, lid_z]) lid_main();
    instance("pin", "pin") translate([75.2, hinge_y, hinge_z]) rotate([0, -90, 0]) pin_geom();
}
